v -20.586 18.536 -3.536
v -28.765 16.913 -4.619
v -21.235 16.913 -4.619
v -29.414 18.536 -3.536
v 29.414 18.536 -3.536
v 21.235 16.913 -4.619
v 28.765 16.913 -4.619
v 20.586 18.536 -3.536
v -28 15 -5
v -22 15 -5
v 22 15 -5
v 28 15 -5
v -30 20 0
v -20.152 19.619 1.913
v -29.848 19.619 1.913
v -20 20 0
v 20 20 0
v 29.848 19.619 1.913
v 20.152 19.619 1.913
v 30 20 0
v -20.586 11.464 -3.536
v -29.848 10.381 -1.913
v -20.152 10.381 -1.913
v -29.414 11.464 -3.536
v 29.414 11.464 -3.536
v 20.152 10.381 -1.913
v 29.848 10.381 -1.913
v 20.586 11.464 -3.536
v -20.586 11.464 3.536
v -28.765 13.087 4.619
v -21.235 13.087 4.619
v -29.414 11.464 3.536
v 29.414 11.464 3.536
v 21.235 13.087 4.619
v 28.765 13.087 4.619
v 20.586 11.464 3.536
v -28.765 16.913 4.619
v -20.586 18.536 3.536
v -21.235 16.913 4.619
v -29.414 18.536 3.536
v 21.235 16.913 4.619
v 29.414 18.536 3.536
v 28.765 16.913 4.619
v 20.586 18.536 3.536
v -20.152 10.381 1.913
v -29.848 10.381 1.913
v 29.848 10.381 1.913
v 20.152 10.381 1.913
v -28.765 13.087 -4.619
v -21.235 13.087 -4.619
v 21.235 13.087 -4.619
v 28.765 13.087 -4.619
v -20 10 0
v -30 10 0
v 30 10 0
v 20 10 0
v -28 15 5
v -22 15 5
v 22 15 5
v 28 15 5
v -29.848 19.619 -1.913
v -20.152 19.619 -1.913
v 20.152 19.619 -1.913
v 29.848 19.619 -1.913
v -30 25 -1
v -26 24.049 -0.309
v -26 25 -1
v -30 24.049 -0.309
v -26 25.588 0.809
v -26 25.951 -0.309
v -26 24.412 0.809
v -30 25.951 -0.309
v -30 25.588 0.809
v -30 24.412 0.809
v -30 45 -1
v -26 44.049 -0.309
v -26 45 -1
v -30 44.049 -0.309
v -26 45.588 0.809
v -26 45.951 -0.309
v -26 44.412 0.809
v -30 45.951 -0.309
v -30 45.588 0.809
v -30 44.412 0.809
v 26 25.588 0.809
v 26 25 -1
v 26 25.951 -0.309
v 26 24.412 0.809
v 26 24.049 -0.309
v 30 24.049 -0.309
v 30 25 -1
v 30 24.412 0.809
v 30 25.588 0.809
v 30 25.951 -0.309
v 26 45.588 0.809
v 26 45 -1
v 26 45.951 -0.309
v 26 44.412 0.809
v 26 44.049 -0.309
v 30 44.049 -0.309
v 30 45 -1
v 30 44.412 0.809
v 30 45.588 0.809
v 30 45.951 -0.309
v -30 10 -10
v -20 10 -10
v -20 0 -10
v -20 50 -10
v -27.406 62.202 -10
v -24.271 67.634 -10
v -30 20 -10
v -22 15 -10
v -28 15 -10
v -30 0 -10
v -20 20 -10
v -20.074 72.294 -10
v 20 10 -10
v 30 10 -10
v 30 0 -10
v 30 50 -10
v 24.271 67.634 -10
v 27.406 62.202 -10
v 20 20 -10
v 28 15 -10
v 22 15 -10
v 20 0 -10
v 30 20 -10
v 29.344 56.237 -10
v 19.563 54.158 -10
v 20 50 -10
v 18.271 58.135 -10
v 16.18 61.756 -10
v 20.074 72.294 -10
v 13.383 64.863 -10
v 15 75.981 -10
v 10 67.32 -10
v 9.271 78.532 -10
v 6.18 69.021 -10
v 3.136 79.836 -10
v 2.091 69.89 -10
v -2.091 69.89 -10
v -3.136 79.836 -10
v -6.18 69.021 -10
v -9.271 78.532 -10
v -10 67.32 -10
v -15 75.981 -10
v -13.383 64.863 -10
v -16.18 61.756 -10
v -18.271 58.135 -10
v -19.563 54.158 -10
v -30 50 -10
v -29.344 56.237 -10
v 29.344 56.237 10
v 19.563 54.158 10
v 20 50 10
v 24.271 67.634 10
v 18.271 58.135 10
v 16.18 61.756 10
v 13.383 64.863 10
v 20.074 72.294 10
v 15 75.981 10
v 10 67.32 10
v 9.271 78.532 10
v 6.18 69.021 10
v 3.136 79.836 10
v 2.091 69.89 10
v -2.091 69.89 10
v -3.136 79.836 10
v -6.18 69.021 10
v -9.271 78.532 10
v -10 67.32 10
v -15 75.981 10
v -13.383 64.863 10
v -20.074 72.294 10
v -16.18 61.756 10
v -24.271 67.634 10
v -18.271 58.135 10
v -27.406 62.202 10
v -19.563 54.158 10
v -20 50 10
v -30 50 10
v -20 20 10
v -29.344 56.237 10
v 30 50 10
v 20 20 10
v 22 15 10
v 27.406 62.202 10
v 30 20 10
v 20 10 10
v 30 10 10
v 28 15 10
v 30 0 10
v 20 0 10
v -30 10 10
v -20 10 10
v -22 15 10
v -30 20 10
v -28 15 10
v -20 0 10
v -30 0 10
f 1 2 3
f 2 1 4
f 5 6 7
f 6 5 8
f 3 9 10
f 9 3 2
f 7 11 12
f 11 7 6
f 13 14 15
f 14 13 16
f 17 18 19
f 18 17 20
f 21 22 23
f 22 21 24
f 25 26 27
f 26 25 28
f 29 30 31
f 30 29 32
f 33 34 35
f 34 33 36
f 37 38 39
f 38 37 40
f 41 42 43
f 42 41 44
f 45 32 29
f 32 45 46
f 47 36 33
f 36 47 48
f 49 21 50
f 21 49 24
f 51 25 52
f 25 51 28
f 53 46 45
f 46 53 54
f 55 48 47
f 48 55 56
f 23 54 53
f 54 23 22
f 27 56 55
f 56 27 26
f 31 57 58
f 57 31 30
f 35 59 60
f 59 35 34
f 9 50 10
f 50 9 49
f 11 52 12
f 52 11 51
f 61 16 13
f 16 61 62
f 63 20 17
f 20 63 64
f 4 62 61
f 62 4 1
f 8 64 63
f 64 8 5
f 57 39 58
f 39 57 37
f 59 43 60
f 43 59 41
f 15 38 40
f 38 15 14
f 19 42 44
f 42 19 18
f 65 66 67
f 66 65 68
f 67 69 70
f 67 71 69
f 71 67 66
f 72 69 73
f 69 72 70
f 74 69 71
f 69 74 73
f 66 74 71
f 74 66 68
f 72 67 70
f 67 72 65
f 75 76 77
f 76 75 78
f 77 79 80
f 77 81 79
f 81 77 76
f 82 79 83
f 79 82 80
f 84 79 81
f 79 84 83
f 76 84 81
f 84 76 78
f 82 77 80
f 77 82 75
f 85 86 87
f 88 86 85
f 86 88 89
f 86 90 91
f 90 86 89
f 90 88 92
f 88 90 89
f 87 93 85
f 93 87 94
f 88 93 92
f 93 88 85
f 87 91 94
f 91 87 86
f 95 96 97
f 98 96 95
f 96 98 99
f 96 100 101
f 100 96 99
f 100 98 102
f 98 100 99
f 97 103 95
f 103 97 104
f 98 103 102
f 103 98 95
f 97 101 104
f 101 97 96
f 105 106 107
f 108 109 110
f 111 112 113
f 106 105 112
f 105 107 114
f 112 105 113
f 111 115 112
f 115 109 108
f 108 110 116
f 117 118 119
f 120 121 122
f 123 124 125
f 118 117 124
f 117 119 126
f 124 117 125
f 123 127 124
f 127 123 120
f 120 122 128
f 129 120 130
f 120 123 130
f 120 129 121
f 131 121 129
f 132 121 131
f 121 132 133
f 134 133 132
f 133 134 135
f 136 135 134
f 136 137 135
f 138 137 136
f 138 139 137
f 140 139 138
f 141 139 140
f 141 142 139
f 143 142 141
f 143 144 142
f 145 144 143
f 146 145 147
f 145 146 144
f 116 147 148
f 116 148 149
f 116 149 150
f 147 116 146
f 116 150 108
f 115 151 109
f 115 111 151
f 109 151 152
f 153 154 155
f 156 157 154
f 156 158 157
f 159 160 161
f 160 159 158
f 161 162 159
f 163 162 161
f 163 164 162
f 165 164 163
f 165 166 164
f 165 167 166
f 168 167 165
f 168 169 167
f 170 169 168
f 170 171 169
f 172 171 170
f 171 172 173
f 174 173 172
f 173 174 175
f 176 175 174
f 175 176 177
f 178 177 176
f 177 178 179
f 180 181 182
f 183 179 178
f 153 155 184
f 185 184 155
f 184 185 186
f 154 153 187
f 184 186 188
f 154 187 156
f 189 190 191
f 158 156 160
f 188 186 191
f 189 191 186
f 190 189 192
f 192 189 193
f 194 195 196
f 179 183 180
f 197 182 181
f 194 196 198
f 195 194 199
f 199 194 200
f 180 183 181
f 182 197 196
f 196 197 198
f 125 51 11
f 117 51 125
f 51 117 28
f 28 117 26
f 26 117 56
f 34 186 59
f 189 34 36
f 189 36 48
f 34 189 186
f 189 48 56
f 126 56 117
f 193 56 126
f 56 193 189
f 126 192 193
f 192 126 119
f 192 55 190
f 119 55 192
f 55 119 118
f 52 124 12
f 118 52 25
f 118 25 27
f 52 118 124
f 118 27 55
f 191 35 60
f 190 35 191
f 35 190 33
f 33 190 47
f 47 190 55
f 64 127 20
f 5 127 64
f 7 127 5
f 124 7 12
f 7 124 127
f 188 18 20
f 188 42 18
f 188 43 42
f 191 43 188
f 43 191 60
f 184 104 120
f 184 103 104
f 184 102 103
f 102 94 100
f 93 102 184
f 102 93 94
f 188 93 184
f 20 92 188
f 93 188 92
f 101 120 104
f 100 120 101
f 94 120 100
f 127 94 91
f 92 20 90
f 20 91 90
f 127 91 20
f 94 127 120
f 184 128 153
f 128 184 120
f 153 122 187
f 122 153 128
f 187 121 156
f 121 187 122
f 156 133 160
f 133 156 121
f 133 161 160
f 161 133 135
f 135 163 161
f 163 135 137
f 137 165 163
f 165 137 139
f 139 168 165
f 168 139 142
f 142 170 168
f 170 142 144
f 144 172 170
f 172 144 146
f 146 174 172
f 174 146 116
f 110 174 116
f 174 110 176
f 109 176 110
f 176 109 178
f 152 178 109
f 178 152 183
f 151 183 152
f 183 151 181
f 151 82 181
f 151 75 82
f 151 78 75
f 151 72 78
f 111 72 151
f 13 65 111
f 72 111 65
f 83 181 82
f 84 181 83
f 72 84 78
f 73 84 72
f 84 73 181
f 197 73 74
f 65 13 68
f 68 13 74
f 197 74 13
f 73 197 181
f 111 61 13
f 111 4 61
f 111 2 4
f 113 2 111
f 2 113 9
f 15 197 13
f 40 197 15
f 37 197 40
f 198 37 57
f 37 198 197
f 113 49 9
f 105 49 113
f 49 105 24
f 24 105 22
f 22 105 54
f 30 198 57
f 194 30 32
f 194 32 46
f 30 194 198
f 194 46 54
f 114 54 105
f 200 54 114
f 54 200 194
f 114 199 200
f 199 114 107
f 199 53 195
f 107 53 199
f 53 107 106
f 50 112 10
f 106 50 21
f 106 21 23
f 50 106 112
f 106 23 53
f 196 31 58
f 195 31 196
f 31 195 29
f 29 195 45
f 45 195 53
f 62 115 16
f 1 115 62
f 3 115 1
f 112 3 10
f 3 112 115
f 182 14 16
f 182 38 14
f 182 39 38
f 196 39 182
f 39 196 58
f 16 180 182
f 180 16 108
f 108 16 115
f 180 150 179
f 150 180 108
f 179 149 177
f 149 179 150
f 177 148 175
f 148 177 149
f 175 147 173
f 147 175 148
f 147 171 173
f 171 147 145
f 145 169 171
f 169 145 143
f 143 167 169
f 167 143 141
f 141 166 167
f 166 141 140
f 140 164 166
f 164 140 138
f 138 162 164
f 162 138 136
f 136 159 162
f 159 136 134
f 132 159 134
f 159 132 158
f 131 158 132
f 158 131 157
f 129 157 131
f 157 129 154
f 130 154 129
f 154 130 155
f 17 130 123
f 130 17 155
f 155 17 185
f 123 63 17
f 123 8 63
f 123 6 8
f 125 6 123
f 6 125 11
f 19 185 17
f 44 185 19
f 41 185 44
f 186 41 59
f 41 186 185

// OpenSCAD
p0 = [-20,0];
p1 = [-30,0];
p2 = [-30,10];
p3 = [-28,15];
p4 = [-30,20];
p5 = [-30,50];
p6 = [-20,50];
p7 = [-20,20];
p8 = [-22,15];
p9 = [-20,10];

l_points = [p0,p1,p2,p3,p4,p5,p6,p7,p8,p9];
i_points = [p0,p6,[20,50],[20,0]];

module base_geo(l_points,i_points){

translate([0,0,-10])
linear_extrude(height=20,twist=0){
    
    {polygon(l_points);

translate([50,0,0]) polygon(l_points);

difference() {
    translate([0,50,0]) circle(30);
    translate([0,50,0]) circle(20);
    polygon(i_points);
}

};
};
};


//datum features

lld = [-31,25,0];
lud = [-31,45,0];
rld = [26,25,0];
rud = [26,45,0];

d = [lld,lud,rld,rud];

module main_geo(d){
difference(){
difference(){
base_geo(l_points,i_points);
    translate([0,15,0])
    rotate([0,90,0])
    union(){
    linear_extrude(height=100,twist=0) circle(5);
    rotate([0,180,0]) linear_extrude(height=100,twist=0) circle(5);
    };
for (i = [0:len(d)-1]){
        translate(d[i]) rotate([0,90,0]) linear_extrude(height=5, twist = 0) circle(1);
    };
}
}
}

//run with argument "d" to get datum features
main_geo(d);
